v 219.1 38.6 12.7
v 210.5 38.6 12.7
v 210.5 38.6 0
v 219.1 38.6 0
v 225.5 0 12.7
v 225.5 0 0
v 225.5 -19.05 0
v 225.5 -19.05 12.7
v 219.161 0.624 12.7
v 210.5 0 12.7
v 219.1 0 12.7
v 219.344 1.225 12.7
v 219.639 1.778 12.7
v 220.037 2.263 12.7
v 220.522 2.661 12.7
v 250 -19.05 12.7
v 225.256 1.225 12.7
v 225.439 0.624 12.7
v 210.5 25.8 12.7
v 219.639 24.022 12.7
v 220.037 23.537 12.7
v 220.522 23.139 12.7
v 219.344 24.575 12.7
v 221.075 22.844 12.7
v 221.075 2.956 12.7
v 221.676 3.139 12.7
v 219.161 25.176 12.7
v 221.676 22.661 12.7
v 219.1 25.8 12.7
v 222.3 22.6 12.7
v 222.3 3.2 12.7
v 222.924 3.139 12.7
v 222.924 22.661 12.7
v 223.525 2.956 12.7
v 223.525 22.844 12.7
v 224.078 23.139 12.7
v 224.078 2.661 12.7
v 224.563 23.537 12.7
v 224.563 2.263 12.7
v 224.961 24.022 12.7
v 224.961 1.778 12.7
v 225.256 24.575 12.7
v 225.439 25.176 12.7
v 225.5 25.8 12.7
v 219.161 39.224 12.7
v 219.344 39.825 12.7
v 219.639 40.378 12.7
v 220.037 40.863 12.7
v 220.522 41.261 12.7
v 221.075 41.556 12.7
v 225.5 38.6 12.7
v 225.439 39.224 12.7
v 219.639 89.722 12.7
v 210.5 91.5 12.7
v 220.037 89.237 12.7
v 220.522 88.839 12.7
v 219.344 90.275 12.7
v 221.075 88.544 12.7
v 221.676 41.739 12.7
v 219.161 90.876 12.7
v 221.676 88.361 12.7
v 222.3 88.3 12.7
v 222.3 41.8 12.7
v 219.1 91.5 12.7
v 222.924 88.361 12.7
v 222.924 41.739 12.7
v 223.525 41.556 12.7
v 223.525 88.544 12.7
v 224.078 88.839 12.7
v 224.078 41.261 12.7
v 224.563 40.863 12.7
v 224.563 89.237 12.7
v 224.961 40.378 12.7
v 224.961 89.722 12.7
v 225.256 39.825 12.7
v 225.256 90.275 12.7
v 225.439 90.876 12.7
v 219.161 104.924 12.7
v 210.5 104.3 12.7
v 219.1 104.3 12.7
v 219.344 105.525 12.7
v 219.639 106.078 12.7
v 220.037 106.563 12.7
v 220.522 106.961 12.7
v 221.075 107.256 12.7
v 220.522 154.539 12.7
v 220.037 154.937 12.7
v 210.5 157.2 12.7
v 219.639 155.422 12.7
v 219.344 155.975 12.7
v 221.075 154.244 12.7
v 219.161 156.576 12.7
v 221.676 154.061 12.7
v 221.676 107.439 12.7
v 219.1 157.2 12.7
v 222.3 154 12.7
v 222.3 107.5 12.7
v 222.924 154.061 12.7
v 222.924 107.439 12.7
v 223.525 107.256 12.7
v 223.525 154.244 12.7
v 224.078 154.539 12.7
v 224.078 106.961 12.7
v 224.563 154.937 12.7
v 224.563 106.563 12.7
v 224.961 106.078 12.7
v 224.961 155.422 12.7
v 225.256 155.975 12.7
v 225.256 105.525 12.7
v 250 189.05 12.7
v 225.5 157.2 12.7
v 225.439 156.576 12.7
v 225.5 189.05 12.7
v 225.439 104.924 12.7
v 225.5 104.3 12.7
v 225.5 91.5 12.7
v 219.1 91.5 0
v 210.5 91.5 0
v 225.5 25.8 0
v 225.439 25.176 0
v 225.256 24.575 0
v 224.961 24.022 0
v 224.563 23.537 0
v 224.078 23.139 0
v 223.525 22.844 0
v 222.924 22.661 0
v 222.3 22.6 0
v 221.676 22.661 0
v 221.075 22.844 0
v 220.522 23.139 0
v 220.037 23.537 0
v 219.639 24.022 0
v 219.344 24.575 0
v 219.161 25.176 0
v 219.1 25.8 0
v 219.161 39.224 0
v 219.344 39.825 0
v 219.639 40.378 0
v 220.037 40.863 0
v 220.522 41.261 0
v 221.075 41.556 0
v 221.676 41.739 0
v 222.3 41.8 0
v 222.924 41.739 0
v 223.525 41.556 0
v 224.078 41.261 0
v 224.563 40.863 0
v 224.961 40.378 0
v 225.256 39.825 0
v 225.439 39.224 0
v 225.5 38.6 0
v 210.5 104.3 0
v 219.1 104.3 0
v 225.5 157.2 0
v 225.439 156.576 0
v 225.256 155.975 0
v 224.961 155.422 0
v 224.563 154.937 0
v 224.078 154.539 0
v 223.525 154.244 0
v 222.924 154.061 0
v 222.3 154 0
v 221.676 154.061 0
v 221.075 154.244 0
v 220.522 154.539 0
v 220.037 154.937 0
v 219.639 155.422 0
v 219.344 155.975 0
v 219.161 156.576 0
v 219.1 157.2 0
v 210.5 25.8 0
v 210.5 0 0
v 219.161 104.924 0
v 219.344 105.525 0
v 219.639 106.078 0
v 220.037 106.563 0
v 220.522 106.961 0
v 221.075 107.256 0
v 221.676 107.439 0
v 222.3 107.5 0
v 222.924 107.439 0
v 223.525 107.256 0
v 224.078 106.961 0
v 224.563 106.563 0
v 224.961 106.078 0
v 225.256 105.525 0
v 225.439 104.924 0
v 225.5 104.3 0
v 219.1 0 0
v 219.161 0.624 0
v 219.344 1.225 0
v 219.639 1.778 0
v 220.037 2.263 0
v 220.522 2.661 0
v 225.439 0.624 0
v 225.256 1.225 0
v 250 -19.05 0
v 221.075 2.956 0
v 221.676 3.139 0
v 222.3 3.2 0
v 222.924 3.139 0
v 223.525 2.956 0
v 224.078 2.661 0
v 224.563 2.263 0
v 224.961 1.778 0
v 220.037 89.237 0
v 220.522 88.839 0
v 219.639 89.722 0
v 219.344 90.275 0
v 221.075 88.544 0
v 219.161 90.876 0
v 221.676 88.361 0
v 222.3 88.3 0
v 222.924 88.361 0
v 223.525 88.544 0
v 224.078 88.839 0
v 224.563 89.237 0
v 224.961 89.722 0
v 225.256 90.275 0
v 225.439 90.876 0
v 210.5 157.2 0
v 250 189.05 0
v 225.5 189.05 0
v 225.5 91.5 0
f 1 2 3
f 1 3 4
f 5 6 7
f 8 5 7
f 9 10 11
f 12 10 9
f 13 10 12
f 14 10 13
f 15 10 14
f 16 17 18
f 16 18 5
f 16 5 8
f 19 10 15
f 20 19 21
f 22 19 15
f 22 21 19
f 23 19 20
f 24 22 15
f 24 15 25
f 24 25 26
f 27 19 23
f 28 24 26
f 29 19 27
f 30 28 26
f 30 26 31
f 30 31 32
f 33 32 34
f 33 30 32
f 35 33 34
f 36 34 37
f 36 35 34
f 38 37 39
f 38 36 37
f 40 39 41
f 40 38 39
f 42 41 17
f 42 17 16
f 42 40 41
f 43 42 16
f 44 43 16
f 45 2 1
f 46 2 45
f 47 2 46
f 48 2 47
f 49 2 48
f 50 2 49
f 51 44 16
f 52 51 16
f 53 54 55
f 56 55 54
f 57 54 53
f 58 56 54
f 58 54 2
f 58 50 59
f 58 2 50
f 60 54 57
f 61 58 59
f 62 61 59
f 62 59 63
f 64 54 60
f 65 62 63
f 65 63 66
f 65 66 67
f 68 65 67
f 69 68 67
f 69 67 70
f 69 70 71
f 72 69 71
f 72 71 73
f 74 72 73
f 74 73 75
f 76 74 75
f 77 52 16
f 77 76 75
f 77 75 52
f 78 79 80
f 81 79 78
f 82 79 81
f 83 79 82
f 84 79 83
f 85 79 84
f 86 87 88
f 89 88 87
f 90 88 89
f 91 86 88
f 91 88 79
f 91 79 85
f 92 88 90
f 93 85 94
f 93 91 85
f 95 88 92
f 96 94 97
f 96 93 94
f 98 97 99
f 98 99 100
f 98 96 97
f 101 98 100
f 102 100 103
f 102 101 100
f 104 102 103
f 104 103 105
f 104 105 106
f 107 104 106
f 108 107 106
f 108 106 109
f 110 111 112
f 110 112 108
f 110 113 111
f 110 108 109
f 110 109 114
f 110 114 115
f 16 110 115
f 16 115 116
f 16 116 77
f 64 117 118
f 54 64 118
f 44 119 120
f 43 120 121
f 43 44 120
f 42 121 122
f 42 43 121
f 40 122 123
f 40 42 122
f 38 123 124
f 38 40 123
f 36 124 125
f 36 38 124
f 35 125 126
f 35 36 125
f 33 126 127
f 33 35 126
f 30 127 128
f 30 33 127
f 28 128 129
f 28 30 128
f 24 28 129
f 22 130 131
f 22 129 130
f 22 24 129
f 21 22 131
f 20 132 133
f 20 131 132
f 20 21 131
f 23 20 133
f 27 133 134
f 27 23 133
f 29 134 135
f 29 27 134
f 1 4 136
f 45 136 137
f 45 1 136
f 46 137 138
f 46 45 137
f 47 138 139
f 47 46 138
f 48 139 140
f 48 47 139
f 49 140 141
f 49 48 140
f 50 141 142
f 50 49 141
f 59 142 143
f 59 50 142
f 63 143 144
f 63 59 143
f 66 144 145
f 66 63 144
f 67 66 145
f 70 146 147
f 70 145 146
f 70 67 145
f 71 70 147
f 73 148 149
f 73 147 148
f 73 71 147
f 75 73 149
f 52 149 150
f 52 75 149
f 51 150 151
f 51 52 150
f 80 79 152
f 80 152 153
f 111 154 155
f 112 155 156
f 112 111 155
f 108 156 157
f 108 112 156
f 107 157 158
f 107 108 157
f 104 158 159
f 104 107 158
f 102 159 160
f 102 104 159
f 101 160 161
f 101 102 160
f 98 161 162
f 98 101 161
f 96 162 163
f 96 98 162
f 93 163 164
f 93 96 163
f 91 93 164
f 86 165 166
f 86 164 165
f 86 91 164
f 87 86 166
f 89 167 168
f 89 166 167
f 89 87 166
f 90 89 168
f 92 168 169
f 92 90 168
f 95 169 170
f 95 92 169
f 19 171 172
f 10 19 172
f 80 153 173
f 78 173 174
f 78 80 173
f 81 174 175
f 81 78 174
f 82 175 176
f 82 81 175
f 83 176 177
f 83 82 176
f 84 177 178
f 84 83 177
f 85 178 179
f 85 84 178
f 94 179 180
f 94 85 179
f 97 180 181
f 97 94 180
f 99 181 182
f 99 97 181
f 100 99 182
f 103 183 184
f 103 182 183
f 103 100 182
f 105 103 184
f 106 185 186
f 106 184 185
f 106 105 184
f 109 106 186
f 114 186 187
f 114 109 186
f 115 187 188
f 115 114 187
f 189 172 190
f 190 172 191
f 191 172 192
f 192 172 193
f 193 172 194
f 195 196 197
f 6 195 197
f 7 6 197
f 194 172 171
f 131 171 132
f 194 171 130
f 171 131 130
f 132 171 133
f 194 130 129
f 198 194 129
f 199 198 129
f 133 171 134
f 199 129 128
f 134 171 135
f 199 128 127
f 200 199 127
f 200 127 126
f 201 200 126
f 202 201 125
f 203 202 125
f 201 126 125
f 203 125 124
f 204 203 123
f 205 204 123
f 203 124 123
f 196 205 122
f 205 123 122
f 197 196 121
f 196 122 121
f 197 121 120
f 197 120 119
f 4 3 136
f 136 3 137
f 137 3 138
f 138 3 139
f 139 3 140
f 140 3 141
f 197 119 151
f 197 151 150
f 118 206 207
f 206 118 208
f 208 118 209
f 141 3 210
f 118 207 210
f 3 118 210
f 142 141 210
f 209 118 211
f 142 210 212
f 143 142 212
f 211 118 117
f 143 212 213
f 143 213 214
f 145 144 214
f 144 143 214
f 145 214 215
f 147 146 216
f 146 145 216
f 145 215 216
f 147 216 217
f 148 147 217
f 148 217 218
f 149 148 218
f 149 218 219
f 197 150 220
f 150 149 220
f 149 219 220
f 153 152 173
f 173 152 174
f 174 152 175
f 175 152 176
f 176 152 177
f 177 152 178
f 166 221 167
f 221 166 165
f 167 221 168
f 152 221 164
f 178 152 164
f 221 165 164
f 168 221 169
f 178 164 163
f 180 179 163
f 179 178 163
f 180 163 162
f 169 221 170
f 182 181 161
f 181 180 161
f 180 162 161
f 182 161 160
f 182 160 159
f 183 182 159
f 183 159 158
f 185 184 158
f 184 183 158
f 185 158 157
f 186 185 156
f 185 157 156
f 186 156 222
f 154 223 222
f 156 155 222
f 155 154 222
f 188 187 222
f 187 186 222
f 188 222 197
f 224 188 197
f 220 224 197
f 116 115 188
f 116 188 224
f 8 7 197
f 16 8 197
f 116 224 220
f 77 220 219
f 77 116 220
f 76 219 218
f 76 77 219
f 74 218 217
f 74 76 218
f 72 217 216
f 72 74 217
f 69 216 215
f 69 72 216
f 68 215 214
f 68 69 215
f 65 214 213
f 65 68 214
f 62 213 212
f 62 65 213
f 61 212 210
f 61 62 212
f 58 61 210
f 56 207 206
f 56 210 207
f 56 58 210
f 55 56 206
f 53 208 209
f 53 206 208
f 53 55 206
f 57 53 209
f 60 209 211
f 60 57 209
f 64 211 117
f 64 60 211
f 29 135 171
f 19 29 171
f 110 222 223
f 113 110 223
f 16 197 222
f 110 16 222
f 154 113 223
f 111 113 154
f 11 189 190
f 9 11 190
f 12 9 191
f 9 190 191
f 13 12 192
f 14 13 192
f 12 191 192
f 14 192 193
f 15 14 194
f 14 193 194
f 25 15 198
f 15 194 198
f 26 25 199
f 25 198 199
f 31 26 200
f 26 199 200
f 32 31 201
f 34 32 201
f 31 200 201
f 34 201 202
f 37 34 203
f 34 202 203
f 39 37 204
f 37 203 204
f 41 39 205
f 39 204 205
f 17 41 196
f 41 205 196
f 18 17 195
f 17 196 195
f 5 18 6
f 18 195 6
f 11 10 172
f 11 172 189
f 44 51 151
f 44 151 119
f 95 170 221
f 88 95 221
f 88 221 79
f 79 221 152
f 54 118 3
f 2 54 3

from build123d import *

# Parameters (mm, degrees)
BOSS_EXTRUDE1_DEPTH = 12.7
CUT_EXTRUDE1_DEPTH  = 314.689643597
LPATTERN1_COUNT     = 3
LPATTERN1_PITCH     = 65.7


with BuildPart() as part:
    # Sketch1 → Boss-Extrude1 (new body)
    with BuildSketch(Plane.XY):
        with BuildLine():
            Line((210.5, 170), (210.5, 0))
            Line((210.5, 0), (219.1, 0))
            ThreePointArc((219.1, 0), (222.3, 3.2), (225.5, 0))
            Line((225.5, 0), (225.5, -19.05))
            Line((225.5, -19.05), (250, -19.05))
            Line((250, -19.05), (250, 0))
            Line((250, 0), (250, 170))
            Line((250, 170), (250, 189.05))
            Line((250, 189.05), (225.5, 189.05))
            Line((225.5, 189.05), (225.5, 170))
            ThreePointArc((225.5, 170), (222.3, 166.8), (219.1, 170))
            Line((219.1, 170), (210.5, 170))
        make_face()
    extrude(amount=BOSS_EXTRUDE1_DEPTH)

    # Sketch2 → Cut-Extrude1 (cut, through all)
    with BuildSketch(Plane.XY.offset(12.7)):
        with BuildLine():
            Line((210.5, 157.2), (210.5, 170))
            Line((210.5, 170), (219.1, 170))
            ThreePointArc((219.1, 170), (222.3, 173.2), (225.5, 170))
            Line((225.5, 170), (225.5, 157.2))
            ThreePointArc((225.5, 157.2), (222.3, 154), (219.1, 157.2))
            Line((219.1, 157.2), (210.5, 157.2))
        make_face()
    cut_extrude1 = extrude(amount=-CUT_EXTRUDE1_DEPTH, mode=Mode.SUBTRACT)

    # LPattern1: Cut-Extrude1 ×3
    with Locations(*[(0, -i * LPATTERN1_PITCH, 0) for i in range(1, LPATTERN1_COUNT)]):
        add(cut_extrude1, mode=Mode.SUBTRACT)


solid = part.part
